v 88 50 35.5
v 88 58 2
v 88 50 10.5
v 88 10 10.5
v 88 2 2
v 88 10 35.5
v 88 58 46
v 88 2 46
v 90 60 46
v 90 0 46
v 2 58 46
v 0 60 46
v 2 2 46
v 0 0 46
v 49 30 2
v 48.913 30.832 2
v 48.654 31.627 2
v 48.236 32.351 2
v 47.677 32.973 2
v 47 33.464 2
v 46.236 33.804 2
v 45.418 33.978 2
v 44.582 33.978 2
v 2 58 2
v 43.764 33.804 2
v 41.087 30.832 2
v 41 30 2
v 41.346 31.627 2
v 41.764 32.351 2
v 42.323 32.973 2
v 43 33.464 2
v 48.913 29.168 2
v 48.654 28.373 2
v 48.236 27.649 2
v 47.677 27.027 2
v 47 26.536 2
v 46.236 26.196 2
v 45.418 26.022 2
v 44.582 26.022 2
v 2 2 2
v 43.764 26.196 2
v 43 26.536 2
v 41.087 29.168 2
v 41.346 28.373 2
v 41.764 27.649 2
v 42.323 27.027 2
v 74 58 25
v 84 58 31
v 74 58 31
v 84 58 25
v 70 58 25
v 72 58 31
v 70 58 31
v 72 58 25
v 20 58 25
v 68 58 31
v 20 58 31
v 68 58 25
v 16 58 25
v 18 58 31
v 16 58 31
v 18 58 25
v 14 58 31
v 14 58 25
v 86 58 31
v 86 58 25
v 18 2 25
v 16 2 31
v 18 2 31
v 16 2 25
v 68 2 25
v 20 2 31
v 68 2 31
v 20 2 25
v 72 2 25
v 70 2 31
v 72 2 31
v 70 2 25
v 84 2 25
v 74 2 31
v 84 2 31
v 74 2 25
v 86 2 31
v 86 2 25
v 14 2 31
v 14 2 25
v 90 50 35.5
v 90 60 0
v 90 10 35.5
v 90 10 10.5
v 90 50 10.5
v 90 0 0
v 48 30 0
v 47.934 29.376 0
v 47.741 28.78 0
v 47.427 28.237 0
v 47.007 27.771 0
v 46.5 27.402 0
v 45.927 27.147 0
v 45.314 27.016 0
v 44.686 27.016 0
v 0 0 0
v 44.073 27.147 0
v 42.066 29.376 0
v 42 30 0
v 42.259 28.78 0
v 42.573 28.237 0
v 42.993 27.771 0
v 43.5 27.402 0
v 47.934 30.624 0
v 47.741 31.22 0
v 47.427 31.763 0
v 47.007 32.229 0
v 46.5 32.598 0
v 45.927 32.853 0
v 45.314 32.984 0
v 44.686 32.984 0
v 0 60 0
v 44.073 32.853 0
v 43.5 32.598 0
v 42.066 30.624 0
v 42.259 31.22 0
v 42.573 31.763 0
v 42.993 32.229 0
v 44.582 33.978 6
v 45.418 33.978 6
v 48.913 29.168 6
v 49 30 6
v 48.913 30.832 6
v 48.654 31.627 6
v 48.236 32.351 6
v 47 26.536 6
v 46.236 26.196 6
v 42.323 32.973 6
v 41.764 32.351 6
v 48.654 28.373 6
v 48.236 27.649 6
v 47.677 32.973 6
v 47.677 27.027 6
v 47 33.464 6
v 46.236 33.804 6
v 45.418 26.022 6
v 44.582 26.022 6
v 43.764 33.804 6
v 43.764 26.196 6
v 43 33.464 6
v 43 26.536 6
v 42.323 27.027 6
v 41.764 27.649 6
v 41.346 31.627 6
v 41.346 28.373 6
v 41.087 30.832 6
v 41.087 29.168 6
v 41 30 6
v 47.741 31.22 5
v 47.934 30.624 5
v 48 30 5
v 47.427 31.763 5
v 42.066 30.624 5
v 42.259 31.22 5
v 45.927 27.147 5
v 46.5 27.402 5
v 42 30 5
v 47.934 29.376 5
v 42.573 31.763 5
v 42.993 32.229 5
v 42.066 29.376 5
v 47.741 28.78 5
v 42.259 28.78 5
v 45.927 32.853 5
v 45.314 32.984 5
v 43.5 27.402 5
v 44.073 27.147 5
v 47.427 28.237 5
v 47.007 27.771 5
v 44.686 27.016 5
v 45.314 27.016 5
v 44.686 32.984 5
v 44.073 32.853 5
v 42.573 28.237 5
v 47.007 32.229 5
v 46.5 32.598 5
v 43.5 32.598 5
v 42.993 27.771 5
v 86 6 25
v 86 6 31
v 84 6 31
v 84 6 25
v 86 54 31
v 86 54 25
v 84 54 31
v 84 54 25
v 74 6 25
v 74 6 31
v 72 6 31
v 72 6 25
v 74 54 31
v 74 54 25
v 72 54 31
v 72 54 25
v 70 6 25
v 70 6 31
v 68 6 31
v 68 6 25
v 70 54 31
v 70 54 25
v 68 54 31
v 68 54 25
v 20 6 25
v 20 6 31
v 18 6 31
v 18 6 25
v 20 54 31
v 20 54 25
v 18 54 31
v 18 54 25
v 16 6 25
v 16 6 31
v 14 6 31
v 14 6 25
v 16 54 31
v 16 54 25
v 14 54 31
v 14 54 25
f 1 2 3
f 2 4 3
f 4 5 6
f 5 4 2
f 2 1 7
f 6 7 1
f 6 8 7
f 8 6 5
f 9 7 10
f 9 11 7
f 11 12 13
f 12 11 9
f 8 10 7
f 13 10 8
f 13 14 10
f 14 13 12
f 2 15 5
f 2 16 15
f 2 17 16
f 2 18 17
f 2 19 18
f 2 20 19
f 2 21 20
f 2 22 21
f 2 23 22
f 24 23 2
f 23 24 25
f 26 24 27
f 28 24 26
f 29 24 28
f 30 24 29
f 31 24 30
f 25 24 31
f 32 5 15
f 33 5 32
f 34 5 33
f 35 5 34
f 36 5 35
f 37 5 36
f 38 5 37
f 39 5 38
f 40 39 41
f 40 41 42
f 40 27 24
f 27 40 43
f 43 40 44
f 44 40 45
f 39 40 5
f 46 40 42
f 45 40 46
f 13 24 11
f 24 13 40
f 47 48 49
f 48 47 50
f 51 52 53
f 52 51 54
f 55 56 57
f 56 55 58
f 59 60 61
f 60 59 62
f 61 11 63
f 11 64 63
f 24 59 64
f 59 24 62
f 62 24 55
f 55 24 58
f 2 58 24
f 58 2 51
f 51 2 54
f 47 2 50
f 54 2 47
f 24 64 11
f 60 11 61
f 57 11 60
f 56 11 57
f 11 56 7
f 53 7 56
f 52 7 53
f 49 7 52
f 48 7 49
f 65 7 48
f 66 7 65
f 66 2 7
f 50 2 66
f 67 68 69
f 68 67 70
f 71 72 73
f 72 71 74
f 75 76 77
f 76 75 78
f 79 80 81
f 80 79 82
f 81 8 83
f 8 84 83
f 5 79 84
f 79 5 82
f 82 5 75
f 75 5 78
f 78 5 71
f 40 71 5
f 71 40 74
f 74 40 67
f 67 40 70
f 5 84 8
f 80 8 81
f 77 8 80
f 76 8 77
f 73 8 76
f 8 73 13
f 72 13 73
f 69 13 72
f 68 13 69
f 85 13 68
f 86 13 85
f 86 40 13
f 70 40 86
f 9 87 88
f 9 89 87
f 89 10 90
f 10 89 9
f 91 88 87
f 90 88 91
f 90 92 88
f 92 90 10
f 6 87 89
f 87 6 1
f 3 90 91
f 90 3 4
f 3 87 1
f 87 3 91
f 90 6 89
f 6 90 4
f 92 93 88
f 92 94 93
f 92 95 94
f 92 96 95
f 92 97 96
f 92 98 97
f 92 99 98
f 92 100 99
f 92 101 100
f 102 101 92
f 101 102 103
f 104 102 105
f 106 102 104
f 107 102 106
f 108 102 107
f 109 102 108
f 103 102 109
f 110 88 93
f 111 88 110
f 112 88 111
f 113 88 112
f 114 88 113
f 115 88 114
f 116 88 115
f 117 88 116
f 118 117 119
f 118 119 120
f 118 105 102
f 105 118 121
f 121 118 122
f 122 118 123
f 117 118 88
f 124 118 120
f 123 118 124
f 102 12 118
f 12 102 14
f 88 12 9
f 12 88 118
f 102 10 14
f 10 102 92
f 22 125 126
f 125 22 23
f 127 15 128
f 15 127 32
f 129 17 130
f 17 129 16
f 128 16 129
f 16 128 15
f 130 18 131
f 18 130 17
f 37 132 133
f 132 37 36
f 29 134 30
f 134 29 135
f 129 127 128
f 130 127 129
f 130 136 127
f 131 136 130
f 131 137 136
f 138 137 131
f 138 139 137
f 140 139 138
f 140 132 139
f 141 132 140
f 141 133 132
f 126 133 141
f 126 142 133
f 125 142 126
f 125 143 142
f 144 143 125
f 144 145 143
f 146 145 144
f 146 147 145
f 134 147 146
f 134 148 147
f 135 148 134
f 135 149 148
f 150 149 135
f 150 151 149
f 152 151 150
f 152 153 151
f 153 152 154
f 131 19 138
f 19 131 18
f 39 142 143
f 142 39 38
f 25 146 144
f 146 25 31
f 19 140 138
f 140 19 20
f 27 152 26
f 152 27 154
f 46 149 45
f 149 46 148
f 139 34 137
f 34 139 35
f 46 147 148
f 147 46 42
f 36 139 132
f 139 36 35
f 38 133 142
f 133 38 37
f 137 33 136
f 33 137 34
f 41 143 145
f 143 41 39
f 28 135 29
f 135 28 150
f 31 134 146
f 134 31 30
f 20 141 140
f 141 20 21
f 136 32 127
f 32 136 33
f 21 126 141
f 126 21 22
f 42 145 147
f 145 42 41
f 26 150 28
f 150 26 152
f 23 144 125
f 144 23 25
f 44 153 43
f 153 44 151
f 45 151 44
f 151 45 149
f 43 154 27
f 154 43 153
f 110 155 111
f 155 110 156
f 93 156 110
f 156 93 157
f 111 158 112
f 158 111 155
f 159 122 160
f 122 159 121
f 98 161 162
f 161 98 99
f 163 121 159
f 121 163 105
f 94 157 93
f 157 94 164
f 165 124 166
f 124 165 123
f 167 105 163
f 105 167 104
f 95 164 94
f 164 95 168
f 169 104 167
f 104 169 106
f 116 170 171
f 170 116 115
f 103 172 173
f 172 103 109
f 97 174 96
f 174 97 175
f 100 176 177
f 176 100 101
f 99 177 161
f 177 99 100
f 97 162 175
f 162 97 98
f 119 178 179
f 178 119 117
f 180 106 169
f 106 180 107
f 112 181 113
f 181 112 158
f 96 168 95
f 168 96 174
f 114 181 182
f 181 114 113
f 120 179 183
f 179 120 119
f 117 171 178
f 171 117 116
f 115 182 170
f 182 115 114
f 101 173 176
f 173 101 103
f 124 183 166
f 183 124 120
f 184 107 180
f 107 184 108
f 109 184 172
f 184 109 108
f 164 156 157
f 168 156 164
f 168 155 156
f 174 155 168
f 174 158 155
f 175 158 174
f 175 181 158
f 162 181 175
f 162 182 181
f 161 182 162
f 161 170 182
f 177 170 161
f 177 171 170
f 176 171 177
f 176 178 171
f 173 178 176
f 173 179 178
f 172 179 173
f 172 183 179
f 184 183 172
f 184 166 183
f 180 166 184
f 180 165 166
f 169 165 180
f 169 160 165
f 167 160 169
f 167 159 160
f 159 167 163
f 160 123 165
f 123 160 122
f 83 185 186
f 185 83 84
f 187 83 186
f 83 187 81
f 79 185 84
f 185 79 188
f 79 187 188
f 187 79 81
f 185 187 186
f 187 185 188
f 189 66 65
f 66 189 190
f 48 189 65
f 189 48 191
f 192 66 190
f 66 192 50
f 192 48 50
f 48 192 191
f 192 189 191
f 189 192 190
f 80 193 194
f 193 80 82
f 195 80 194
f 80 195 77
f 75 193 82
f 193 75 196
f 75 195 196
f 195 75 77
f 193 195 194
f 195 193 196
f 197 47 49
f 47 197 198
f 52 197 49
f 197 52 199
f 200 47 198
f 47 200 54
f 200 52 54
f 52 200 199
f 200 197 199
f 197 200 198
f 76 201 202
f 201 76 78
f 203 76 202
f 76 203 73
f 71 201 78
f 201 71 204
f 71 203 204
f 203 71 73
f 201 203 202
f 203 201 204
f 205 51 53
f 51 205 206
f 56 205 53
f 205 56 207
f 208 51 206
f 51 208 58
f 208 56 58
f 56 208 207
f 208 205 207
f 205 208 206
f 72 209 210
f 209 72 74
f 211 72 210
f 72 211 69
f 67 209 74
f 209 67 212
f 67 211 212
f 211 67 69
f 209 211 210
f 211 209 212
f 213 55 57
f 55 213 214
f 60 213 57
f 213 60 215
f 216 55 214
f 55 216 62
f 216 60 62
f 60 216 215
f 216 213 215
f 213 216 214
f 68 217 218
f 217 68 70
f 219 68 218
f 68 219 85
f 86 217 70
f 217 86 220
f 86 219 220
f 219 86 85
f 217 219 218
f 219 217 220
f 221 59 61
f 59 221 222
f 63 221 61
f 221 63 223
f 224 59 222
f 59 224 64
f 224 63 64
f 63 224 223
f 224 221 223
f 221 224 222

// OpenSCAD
$fn=30;
module box(box_x,box_y,box_z,box_t,win_y,win_z,cyl_r,cyl_h,cyl_t){
    difference(){
        union(){
            difference(){
                cube([box_x,box_y,box_z]);
                union(){
                            //
                            translate([box_t,box_t,box_t])
                            cube([box_x-(2*box_t),box_y-(2*box_t),box_z-box_t]);
                            translate([box_x-box_t,box_y/2-win_y/2,box_z/2-win_z/2])
                            cube([box_t,win_y,win_z]);        
                }    
            }
            translate([box_x/2,box_y/2,0])cylinder(r=cyl_r,h=cyl_h);
        }
        translate([box_x/2,box_y/2,0])cylinder(r=cyl_r-cyl_t,h=cyl_h-cyl_t);
    }
    translate([0,0,box_z/2]){
        translate([(box_x-(2*box_t))-2-2,0,0])slot(2,4,6,2,box_x,box_y,box_z,box_t);
        translate([(box_x-(2*box_t))-2-2-12,0,0])slot(2,4,6,2,box_x,box_y,box_z,box_t);
        translate([(box_x-(2*box_t))-2-2-12-4,0,0])slot(2,4,6,2,box_x,box_y,box_z,box_t);
        translate([(box_x-(2*box_t))-2-2-12-4-48-2,0,0])slot(2,4,6,2,box_x,box_y,box_z,box_t);
        translate([(box_x-(2*box_t))-2-2-12-4-48-2-4,0,0])slot(2,4,6,2,box_x,box_y,box_z,box_t);
    }
}
//cube - spacing - thickness of material
//cylinder height taken from the base of the cube
//slot(x,y,z,spacing)
//box(box x,box y, box z,thickness,window x,window y,cylinder radius,height, thickness)
box(90,60,46,2,40,25,4,6,1);

module slot(slot_x,slot_y,slot_z,slot_s,box_x,box_y,box_z,box_t){
    translate([box_t,box_t,box_t]){
        cube([slot_x,slot_y,slot_z]);
        translate([0,(box_y-(box_t*2))-slot_y,0]){cube([slot_x,slot_y,slot_z]);}
    }
}
